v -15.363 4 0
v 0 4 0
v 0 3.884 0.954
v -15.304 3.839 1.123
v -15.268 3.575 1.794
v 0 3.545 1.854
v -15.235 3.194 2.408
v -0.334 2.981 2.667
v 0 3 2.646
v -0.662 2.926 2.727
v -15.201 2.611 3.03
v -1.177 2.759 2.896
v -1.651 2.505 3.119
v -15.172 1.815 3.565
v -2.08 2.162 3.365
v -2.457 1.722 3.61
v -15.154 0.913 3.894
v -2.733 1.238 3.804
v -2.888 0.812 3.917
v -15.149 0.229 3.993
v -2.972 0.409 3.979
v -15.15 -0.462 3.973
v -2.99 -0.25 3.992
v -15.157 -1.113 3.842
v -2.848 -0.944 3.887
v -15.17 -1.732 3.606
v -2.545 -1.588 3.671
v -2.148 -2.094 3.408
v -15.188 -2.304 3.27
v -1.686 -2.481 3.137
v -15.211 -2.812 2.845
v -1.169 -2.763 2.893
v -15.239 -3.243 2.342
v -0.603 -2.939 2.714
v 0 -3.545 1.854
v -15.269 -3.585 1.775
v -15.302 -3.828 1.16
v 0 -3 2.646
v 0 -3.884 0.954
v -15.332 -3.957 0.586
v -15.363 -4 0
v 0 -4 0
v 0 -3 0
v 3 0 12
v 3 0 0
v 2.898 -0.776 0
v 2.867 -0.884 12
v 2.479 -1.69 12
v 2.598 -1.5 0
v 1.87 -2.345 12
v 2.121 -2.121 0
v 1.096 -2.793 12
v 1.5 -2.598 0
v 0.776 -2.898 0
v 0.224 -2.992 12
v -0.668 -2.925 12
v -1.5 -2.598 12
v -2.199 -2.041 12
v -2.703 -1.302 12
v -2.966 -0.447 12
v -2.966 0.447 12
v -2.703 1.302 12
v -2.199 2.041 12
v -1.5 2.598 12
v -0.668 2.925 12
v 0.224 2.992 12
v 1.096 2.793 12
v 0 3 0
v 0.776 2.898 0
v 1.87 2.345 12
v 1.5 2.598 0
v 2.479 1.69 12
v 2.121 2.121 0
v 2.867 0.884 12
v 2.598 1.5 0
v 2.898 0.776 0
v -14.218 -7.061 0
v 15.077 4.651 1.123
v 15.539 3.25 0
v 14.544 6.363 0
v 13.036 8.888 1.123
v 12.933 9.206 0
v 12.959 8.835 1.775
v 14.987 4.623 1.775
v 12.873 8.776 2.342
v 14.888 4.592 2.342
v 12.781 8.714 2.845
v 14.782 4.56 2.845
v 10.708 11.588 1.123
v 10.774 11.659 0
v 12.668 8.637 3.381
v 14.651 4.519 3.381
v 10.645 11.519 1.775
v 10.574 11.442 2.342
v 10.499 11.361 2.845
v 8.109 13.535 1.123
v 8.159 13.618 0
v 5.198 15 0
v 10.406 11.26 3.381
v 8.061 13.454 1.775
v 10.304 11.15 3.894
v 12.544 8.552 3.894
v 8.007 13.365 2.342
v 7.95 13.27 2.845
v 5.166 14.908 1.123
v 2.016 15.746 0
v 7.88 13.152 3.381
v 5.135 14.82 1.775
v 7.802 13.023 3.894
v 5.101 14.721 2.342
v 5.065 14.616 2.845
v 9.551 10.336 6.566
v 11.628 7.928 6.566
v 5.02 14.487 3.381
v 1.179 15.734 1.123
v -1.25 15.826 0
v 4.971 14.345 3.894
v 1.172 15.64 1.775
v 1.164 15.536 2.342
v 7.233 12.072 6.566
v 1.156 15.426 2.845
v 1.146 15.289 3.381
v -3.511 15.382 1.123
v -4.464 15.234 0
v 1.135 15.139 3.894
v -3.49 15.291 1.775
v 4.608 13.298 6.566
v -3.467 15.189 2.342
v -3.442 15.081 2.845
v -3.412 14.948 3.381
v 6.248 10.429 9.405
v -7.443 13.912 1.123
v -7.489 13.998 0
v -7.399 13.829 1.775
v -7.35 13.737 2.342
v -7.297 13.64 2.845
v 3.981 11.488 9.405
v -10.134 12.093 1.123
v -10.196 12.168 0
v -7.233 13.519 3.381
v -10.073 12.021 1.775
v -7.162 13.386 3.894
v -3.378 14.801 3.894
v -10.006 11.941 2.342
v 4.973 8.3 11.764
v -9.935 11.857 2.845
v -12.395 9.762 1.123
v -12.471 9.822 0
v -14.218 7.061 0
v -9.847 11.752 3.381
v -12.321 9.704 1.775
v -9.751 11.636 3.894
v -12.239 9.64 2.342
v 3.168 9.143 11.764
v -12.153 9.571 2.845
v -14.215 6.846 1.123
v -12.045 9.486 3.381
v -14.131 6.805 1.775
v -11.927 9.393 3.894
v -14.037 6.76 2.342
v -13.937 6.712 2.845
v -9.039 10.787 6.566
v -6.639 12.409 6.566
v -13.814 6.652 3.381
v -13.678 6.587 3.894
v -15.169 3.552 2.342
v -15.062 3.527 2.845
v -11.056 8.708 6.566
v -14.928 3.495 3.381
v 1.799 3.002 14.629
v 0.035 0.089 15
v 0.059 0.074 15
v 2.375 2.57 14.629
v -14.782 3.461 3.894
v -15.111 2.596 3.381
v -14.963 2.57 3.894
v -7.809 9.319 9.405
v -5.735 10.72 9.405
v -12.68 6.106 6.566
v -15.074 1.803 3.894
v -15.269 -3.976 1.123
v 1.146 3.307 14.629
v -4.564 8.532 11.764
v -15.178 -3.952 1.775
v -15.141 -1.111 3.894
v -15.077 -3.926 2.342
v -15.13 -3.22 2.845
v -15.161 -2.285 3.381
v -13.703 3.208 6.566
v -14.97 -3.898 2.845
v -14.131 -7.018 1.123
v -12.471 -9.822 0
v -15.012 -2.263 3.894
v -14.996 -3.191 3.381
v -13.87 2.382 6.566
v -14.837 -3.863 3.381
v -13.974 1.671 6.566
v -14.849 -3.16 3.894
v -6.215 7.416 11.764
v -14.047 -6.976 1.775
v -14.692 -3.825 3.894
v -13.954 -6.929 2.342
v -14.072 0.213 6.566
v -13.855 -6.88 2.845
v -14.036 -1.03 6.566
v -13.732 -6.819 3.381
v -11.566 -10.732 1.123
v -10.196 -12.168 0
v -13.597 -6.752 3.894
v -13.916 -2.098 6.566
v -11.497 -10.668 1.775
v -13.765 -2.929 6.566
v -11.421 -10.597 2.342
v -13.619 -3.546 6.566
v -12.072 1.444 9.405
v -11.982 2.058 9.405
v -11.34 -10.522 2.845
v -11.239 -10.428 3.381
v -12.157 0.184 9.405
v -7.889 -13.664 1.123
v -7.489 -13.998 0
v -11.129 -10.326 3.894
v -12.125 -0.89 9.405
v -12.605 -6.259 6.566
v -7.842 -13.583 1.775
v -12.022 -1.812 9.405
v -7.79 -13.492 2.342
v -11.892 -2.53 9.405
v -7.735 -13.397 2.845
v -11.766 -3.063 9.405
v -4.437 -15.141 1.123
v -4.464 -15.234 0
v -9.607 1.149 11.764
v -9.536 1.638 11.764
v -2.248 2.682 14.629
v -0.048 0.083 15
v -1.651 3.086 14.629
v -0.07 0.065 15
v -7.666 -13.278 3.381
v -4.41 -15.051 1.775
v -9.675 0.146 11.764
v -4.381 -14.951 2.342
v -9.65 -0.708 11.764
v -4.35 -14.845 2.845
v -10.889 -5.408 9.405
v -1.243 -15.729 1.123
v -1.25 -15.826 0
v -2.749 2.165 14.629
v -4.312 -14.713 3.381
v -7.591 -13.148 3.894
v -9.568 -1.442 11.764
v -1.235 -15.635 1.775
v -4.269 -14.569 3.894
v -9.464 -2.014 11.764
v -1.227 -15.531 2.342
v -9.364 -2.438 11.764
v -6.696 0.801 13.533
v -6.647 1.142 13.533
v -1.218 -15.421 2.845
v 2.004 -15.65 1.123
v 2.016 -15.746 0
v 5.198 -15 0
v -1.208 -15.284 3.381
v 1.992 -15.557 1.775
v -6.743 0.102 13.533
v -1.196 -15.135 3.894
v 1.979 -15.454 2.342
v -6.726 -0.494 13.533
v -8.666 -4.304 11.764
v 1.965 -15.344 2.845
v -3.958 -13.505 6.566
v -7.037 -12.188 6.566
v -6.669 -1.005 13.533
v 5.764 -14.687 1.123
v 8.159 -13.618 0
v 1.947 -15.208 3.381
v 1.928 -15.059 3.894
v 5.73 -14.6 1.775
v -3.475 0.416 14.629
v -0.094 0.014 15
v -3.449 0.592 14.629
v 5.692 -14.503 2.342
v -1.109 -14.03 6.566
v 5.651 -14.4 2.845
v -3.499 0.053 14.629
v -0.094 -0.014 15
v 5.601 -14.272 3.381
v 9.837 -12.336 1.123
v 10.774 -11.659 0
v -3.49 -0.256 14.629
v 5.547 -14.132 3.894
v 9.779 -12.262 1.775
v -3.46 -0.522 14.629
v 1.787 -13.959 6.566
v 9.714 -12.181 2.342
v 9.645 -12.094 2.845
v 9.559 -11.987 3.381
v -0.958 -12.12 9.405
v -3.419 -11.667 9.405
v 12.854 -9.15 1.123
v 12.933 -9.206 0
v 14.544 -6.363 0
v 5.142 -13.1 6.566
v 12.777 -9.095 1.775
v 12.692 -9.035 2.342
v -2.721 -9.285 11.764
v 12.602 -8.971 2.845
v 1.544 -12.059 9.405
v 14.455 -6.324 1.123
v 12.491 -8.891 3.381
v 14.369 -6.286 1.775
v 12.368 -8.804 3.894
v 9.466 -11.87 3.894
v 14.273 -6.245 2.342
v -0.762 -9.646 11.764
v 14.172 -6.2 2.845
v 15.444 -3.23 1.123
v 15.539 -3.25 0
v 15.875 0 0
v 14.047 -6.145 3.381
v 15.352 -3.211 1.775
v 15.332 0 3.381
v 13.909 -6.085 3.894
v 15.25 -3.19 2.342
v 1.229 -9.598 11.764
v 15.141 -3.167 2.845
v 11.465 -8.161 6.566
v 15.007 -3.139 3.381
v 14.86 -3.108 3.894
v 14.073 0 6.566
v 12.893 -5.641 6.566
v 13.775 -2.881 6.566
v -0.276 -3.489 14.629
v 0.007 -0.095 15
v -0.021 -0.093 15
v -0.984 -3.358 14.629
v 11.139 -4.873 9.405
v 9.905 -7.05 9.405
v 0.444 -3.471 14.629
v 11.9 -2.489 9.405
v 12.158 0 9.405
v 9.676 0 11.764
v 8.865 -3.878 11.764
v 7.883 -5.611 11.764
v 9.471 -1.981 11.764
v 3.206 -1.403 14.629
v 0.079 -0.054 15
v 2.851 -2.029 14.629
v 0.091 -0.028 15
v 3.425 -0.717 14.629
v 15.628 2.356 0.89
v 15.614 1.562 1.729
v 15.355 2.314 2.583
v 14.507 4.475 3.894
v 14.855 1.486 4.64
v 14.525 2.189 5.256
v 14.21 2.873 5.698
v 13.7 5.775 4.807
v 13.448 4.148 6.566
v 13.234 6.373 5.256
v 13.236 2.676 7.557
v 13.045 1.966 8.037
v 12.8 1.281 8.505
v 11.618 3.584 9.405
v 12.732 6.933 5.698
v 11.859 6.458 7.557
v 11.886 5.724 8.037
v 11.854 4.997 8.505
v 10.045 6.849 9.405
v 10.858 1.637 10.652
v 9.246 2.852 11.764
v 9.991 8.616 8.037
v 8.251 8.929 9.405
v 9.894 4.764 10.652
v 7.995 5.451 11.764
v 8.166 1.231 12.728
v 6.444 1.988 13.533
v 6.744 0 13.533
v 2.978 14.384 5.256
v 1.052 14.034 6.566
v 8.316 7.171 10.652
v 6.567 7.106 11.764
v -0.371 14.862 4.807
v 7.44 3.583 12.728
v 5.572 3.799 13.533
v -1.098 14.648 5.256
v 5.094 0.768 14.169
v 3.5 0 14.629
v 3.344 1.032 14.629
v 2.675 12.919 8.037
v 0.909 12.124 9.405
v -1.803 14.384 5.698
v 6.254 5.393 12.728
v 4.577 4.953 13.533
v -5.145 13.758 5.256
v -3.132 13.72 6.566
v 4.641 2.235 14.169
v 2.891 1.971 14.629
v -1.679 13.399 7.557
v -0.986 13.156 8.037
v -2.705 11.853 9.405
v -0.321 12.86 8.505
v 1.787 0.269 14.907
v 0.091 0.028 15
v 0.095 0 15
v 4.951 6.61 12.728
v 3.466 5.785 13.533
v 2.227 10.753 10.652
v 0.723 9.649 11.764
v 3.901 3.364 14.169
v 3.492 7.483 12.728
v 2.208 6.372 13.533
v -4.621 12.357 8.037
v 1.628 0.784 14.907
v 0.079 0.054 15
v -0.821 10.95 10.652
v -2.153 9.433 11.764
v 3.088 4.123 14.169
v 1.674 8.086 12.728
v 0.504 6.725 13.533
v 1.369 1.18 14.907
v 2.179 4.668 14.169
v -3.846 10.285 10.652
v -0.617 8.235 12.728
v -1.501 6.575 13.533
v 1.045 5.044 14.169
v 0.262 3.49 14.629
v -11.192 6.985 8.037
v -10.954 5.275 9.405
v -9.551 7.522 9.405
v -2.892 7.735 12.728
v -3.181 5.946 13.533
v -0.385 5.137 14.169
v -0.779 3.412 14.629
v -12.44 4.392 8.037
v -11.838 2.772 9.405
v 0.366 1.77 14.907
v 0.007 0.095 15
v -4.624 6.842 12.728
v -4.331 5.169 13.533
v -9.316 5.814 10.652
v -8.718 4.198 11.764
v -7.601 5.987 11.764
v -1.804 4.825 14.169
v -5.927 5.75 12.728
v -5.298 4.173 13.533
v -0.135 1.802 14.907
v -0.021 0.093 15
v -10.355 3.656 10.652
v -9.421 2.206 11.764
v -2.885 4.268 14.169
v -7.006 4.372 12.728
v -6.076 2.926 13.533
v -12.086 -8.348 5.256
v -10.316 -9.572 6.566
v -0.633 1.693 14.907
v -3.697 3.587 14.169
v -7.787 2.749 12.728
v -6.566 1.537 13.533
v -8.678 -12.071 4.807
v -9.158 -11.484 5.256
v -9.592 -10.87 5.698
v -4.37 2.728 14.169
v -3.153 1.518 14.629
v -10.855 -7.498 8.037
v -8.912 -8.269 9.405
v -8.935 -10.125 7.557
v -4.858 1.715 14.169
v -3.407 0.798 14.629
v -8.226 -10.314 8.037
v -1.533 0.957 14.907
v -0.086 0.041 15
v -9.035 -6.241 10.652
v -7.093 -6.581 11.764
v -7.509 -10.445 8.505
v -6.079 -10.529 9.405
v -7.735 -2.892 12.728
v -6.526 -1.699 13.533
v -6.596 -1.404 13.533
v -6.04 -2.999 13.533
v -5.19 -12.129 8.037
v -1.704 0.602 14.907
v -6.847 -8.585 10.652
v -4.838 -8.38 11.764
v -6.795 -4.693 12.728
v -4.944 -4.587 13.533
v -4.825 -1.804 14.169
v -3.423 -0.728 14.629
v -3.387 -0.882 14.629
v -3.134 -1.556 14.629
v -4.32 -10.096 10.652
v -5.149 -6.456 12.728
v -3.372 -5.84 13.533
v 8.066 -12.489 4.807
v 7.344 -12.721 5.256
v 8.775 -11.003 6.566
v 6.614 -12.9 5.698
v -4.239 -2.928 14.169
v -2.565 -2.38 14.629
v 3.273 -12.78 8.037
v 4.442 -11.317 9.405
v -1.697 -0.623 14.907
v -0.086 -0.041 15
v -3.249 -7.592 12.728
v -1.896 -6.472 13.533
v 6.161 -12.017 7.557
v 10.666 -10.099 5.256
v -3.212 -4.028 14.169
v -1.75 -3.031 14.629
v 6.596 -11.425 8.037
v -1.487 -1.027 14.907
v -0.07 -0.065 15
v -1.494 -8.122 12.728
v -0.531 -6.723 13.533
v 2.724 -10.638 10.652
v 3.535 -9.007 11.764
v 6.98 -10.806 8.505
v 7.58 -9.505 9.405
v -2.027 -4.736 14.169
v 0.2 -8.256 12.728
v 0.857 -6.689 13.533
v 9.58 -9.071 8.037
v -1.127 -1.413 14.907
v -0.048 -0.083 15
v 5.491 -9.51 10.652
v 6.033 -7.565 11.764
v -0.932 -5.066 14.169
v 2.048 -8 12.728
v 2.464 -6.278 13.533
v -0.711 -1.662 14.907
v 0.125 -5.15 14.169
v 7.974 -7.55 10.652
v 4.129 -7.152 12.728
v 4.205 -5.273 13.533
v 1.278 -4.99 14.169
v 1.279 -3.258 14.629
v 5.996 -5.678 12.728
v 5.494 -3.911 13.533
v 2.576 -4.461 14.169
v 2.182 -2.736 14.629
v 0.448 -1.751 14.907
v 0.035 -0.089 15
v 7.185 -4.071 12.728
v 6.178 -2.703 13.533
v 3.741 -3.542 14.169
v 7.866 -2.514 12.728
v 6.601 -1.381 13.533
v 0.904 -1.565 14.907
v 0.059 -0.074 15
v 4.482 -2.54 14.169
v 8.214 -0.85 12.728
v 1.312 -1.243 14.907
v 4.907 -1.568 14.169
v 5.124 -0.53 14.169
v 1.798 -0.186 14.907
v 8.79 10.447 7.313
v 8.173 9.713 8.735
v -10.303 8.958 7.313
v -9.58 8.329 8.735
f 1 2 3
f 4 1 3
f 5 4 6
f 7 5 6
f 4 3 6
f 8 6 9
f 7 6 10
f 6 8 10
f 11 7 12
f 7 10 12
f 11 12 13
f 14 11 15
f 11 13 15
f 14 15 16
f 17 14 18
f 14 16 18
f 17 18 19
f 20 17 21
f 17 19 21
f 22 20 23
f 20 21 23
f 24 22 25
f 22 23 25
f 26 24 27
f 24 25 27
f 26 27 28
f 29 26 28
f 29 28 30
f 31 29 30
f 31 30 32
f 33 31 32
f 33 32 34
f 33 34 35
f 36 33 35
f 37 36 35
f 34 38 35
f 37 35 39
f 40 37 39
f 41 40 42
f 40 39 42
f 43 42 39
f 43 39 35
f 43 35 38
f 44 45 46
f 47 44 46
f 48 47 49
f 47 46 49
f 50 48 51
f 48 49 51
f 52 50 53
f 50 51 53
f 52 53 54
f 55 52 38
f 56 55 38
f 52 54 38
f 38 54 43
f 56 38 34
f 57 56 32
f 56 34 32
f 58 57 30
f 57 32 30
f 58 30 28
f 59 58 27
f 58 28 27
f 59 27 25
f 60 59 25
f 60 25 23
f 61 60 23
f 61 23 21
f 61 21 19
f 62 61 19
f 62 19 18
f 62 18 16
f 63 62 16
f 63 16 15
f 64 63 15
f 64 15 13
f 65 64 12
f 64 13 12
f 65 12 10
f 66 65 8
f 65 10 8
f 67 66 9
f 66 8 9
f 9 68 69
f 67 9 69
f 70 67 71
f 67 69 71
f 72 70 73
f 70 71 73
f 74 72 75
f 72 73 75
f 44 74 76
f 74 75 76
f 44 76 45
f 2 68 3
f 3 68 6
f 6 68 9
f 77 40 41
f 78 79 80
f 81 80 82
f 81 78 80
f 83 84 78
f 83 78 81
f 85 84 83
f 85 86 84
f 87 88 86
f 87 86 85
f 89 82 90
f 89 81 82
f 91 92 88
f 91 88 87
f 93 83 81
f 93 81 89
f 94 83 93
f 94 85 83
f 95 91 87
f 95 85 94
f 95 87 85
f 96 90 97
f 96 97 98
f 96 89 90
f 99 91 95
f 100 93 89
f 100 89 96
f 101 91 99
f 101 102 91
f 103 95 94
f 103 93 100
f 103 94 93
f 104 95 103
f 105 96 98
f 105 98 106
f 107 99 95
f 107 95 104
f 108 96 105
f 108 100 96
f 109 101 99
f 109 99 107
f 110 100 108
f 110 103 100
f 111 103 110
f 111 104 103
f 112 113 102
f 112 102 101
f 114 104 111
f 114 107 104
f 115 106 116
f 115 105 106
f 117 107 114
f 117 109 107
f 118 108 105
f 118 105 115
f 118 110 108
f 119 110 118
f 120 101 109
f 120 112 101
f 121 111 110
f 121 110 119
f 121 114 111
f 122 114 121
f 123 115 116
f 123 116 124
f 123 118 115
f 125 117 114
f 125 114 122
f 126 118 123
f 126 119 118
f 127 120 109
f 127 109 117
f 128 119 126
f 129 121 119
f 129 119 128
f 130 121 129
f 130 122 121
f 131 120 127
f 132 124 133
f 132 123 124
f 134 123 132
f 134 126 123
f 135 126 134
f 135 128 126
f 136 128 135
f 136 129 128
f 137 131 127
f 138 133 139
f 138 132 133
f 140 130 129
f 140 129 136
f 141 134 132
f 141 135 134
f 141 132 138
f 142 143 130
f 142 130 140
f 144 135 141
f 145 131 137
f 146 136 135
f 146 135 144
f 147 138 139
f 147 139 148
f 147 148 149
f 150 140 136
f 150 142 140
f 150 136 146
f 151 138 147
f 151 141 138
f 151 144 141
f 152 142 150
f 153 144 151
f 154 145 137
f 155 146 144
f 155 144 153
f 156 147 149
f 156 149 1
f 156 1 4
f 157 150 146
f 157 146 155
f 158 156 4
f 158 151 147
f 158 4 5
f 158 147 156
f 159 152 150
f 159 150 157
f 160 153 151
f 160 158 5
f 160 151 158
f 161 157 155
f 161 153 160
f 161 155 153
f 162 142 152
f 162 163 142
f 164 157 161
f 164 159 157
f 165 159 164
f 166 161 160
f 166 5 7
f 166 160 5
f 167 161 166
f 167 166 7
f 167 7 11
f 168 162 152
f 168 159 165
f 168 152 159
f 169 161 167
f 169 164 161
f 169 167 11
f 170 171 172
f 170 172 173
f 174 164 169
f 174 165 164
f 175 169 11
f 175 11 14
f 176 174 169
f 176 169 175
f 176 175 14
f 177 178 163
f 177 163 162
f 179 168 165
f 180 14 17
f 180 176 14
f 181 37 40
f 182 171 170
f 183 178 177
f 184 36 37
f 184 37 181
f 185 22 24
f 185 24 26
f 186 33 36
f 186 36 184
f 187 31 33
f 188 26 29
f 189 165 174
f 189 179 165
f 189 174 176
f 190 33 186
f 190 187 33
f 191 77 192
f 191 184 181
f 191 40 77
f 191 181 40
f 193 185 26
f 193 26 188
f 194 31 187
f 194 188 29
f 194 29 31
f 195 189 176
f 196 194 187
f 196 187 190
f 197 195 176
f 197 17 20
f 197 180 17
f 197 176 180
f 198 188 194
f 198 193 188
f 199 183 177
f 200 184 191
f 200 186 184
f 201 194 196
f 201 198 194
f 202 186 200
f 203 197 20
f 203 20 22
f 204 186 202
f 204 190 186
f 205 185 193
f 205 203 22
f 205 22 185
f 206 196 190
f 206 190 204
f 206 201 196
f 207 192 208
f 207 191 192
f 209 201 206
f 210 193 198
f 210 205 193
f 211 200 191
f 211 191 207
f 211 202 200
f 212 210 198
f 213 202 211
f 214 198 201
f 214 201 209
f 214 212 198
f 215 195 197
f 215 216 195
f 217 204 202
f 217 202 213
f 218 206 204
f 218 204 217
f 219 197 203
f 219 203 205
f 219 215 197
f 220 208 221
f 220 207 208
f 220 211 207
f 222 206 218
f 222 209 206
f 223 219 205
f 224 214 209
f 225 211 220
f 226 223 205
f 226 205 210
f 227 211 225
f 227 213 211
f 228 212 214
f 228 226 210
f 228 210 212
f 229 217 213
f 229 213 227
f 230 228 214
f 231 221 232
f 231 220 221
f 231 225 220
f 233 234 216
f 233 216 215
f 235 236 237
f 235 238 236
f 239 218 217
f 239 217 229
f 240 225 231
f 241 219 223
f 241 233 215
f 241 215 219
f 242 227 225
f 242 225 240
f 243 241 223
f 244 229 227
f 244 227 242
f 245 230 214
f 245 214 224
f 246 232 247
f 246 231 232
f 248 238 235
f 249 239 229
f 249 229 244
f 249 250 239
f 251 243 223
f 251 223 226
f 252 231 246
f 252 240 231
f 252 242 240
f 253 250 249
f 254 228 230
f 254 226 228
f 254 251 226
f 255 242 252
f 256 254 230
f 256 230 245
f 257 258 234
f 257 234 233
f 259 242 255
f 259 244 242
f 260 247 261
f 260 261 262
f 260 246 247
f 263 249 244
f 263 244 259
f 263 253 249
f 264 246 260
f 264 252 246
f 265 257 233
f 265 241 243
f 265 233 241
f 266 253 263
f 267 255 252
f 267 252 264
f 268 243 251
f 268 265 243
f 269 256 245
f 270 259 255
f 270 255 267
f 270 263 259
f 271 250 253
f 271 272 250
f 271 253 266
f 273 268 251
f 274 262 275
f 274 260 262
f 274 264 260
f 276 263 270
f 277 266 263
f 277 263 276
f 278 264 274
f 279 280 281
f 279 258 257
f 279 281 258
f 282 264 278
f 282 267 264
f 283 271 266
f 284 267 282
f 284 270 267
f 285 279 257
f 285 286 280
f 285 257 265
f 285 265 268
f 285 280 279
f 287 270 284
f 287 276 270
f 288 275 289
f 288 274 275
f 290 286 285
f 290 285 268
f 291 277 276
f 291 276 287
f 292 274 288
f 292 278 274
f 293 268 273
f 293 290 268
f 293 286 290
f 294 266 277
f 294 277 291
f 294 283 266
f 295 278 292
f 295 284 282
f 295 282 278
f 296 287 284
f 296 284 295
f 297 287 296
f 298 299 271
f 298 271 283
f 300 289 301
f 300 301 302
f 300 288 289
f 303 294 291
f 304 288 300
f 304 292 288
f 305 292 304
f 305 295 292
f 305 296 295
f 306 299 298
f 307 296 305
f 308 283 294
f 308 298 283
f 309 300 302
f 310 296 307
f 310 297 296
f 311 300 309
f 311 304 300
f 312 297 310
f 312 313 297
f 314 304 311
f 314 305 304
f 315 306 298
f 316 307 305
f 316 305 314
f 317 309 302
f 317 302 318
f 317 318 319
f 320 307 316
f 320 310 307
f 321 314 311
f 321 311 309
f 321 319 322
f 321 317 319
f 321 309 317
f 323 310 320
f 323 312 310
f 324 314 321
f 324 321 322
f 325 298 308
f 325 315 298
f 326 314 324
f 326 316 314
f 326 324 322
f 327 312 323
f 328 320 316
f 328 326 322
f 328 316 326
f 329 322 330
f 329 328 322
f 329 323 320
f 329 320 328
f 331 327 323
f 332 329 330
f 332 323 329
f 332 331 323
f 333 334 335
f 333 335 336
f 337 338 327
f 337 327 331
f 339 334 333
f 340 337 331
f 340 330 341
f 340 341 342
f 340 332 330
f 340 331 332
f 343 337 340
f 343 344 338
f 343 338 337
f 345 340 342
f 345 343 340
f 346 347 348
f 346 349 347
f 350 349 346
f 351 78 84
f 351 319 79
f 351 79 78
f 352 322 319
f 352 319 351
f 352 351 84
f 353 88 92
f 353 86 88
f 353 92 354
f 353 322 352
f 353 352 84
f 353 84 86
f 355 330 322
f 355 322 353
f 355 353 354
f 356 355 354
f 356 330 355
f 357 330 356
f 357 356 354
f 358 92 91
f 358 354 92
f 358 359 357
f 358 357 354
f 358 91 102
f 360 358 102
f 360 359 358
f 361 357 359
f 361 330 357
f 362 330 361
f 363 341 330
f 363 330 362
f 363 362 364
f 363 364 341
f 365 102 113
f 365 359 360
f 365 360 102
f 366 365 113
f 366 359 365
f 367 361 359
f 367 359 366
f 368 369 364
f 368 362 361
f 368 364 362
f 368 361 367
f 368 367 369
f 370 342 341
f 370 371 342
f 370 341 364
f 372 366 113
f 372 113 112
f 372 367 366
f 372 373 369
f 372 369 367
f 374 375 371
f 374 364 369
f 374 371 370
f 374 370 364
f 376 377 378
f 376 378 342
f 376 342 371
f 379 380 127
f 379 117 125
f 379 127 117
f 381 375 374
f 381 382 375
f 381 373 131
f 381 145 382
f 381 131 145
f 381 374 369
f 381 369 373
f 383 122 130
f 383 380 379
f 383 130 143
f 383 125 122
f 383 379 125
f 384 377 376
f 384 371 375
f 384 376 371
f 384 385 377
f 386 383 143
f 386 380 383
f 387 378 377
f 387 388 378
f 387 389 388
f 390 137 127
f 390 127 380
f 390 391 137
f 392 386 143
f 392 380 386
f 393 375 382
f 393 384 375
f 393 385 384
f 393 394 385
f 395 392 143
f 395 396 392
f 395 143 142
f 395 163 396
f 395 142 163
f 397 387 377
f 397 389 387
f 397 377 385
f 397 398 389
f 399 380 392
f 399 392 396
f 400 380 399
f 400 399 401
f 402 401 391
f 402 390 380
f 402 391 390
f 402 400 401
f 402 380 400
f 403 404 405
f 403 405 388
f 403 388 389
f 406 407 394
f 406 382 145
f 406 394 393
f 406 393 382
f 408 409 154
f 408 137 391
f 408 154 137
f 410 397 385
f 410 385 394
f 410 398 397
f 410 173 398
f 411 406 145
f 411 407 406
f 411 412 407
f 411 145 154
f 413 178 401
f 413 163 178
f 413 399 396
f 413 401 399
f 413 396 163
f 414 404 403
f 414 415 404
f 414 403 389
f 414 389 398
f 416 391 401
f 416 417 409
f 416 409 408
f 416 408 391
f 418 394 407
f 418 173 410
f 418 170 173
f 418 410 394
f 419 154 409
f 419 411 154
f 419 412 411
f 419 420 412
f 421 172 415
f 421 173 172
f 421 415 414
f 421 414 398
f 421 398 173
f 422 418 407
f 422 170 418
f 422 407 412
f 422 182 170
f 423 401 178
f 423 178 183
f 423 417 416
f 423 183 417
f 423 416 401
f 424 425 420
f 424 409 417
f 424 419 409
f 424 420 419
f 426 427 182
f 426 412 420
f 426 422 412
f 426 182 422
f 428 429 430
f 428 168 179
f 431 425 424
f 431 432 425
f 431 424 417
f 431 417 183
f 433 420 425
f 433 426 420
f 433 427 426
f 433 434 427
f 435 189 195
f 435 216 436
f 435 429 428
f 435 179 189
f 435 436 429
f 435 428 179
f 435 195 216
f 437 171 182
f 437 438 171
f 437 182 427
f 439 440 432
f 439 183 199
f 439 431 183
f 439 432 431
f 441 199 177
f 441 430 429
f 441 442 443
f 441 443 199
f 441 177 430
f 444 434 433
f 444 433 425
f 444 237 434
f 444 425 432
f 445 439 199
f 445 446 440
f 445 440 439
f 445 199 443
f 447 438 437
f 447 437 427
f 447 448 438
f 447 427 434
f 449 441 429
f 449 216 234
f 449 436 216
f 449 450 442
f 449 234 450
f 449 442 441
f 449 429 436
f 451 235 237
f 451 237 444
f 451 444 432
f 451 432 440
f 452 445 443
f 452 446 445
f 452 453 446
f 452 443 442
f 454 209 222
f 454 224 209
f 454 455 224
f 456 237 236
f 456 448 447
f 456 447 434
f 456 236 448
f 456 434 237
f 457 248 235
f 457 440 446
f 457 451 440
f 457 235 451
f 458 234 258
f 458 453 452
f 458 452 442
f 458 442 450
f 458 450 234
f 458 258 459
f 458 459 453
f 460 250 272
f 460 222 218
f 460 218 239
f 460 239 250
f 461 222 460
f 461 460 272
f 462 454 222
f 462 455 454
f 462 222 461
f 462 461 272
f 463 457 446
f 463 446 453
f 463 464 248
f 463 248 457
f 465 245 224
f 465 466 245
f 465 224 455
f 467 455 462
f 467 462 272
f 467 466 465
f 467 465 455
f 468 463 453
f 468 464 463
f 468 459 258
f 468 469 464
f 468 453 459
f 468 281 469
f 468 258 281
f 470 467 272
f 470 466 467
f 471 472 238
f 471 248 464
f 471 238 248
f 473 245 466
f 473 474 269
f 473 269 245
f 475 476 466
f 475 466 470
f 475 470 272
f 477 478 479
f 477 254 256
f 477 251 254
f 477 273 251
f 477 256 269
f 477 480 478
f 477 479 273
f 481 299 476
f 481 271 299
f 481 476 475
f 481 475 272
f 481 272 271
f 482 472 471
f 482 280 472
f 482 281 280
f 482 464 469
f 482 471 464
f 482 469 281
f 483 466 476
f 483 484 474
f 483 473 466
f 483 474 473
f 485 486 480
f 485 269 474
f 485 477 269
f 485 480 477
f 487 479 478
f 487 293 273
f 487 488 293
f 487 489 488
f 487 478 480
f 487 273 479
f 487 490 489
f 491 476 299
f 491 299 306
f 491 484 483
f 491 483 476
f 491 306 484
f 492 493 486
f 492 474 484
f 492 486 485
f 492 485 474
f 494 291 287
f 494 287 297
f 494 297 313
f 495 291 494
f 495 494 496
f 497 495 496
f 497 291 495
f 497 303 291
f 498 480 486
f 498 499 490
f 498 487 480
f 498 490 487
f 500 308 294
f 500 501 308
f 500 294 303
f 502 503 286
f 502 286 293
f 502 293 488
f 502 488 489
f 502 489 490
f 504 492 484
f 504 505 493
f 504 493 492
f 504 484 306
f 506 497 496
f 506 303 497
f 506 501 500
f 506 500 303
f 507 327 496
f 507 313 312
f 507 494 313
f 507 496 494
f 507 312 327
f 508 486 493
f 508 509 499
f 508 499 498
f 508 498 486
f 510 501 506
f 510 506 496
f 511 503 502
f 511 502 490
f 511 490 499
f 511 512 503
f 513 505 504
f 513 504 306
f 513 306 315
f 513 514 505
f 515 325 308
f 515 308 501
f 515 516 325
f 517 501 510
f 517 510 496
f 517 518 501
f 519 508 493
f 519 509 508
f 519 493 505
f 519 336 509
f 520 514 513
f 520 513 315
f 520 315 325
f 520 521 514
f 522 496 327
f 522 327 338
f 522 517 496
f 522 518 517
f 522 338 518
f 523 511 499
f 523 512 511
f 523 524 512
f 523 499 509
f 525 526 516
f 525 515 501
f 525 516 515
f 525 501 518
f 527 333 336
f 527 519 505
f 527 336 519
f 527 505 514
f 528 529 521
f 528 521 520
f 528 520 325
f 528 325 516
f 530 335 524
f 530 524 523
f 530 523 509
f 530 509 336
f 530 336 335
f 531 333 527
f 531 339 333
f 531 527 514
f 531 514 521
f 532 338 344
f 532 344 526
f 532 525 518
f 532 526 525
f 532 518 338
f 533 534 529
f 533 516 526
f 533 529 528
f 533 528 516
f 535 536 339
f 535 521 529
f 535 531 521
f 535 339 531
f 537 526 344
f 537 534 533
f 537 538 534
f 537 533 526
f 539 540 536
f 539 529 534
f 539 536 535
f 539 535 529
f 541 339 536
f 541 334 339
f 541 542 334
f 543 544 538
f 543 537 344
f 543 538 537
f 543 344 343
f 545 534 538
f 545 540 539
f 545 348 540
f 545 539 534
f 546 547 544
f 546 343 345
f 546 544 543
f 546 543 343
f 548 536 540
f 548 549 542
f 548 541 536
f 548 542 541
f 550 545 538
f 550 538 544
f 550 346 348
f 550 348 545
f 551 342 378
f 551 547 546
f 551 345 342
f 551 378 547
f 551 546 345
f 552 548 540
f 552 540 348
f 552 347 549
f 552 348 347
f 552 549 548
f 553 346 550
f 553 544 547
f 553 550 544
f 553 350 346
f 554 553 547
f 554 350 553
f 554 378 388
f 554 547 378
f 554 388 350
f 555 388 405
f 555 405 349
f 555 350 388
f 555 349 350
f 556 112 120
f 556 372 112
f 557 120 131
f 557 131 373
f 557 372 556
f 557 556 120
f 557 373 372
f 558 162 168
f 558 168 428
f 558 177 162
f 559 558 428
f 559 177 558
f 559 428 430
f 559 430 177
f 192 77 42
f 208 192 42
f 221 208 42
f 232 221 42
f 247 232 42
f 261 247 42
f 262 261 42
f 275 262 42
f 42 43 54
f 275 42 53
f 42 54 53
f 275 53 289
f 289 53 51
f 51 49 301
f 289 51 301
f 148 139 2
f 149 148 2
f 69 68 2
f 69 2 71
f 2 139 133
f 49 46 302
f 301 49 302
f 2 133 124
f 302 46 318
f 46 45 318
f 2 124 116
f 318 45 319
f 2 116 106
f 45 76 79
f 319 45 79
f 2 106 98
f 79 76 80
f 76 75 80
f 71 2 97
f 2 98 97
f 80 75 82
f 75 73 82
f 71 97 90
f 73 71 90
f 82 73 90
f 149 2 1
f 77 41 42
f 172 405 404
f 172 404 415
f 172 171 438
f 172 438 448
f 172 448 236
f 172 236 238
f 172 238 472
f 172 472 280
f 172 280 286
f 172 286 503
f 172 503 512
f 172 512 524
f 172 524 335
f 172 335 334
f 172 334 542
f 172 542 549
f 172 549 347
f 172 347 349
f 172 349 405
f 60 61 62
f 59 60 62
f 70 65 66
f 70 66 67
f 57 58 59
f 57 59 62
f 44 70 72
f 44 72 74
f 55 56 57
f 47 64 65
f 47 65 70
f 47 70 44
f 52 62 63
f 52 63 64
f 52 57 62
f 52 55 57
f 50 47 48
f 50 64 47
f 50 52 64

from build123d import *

# Parameters (mm, degrees)
F0_R     = 15.875
F1_DEPTH = 15
F3_R     = 3
F4_DEPTH = 12
F5_R     = 4
F6_DEPTH = 25


# Not quite as in the source:
# - a fillet or chamfer that OpenCascade refuses, or shapes differently, is made with other operations: its cross-section is extruded or revolved along the edge and cut away or added


with BuildPart() as f1:
    # F0 (on Top) → F1 (new body)
    with BuildSketch(Plane.XY):
        Circle(F0_R)
    extrude(amount=F1_DEPTH)

    # F2: fillet of radius 15.8 on 1 edges, made by hand

    # F2_s1 → F2_t2 (revolve, cut)
    with BuildSketch(Plane.XZ):
        with BuildLine():
            ThreePointArc((15.875, 0), (10.9810366905, 10.6516374375), (0.0952661619, 15))
            Line((0.0952661619, 15), (15.875, 15))
            Line((15.875, 15), (15.875, 0))
        make_face()
    revolve(axis=Axis((0, 0, 15), (0, 0, 1)), mode=Mode.SUBTRACT)

    # F3 (on face) → F4 (cut)
    with BuildSketch(Plane(origin=(0, 0, 0), x_dir=(1, 0, 0), z_dir=(0, 0, -1))):
        Circle(F3_R)
    extrude(amount=-F4_DEPTH, mode=Mode.SUBTRACT)

    # F5 (on Right) → F6 (cut)
    with BuildSketch(Plane.YZ):
        Circle(F5_R)
    extrude(amount=-F6_DEPTH, mode=Mode.SUBTRACT)


solid = f1.part
